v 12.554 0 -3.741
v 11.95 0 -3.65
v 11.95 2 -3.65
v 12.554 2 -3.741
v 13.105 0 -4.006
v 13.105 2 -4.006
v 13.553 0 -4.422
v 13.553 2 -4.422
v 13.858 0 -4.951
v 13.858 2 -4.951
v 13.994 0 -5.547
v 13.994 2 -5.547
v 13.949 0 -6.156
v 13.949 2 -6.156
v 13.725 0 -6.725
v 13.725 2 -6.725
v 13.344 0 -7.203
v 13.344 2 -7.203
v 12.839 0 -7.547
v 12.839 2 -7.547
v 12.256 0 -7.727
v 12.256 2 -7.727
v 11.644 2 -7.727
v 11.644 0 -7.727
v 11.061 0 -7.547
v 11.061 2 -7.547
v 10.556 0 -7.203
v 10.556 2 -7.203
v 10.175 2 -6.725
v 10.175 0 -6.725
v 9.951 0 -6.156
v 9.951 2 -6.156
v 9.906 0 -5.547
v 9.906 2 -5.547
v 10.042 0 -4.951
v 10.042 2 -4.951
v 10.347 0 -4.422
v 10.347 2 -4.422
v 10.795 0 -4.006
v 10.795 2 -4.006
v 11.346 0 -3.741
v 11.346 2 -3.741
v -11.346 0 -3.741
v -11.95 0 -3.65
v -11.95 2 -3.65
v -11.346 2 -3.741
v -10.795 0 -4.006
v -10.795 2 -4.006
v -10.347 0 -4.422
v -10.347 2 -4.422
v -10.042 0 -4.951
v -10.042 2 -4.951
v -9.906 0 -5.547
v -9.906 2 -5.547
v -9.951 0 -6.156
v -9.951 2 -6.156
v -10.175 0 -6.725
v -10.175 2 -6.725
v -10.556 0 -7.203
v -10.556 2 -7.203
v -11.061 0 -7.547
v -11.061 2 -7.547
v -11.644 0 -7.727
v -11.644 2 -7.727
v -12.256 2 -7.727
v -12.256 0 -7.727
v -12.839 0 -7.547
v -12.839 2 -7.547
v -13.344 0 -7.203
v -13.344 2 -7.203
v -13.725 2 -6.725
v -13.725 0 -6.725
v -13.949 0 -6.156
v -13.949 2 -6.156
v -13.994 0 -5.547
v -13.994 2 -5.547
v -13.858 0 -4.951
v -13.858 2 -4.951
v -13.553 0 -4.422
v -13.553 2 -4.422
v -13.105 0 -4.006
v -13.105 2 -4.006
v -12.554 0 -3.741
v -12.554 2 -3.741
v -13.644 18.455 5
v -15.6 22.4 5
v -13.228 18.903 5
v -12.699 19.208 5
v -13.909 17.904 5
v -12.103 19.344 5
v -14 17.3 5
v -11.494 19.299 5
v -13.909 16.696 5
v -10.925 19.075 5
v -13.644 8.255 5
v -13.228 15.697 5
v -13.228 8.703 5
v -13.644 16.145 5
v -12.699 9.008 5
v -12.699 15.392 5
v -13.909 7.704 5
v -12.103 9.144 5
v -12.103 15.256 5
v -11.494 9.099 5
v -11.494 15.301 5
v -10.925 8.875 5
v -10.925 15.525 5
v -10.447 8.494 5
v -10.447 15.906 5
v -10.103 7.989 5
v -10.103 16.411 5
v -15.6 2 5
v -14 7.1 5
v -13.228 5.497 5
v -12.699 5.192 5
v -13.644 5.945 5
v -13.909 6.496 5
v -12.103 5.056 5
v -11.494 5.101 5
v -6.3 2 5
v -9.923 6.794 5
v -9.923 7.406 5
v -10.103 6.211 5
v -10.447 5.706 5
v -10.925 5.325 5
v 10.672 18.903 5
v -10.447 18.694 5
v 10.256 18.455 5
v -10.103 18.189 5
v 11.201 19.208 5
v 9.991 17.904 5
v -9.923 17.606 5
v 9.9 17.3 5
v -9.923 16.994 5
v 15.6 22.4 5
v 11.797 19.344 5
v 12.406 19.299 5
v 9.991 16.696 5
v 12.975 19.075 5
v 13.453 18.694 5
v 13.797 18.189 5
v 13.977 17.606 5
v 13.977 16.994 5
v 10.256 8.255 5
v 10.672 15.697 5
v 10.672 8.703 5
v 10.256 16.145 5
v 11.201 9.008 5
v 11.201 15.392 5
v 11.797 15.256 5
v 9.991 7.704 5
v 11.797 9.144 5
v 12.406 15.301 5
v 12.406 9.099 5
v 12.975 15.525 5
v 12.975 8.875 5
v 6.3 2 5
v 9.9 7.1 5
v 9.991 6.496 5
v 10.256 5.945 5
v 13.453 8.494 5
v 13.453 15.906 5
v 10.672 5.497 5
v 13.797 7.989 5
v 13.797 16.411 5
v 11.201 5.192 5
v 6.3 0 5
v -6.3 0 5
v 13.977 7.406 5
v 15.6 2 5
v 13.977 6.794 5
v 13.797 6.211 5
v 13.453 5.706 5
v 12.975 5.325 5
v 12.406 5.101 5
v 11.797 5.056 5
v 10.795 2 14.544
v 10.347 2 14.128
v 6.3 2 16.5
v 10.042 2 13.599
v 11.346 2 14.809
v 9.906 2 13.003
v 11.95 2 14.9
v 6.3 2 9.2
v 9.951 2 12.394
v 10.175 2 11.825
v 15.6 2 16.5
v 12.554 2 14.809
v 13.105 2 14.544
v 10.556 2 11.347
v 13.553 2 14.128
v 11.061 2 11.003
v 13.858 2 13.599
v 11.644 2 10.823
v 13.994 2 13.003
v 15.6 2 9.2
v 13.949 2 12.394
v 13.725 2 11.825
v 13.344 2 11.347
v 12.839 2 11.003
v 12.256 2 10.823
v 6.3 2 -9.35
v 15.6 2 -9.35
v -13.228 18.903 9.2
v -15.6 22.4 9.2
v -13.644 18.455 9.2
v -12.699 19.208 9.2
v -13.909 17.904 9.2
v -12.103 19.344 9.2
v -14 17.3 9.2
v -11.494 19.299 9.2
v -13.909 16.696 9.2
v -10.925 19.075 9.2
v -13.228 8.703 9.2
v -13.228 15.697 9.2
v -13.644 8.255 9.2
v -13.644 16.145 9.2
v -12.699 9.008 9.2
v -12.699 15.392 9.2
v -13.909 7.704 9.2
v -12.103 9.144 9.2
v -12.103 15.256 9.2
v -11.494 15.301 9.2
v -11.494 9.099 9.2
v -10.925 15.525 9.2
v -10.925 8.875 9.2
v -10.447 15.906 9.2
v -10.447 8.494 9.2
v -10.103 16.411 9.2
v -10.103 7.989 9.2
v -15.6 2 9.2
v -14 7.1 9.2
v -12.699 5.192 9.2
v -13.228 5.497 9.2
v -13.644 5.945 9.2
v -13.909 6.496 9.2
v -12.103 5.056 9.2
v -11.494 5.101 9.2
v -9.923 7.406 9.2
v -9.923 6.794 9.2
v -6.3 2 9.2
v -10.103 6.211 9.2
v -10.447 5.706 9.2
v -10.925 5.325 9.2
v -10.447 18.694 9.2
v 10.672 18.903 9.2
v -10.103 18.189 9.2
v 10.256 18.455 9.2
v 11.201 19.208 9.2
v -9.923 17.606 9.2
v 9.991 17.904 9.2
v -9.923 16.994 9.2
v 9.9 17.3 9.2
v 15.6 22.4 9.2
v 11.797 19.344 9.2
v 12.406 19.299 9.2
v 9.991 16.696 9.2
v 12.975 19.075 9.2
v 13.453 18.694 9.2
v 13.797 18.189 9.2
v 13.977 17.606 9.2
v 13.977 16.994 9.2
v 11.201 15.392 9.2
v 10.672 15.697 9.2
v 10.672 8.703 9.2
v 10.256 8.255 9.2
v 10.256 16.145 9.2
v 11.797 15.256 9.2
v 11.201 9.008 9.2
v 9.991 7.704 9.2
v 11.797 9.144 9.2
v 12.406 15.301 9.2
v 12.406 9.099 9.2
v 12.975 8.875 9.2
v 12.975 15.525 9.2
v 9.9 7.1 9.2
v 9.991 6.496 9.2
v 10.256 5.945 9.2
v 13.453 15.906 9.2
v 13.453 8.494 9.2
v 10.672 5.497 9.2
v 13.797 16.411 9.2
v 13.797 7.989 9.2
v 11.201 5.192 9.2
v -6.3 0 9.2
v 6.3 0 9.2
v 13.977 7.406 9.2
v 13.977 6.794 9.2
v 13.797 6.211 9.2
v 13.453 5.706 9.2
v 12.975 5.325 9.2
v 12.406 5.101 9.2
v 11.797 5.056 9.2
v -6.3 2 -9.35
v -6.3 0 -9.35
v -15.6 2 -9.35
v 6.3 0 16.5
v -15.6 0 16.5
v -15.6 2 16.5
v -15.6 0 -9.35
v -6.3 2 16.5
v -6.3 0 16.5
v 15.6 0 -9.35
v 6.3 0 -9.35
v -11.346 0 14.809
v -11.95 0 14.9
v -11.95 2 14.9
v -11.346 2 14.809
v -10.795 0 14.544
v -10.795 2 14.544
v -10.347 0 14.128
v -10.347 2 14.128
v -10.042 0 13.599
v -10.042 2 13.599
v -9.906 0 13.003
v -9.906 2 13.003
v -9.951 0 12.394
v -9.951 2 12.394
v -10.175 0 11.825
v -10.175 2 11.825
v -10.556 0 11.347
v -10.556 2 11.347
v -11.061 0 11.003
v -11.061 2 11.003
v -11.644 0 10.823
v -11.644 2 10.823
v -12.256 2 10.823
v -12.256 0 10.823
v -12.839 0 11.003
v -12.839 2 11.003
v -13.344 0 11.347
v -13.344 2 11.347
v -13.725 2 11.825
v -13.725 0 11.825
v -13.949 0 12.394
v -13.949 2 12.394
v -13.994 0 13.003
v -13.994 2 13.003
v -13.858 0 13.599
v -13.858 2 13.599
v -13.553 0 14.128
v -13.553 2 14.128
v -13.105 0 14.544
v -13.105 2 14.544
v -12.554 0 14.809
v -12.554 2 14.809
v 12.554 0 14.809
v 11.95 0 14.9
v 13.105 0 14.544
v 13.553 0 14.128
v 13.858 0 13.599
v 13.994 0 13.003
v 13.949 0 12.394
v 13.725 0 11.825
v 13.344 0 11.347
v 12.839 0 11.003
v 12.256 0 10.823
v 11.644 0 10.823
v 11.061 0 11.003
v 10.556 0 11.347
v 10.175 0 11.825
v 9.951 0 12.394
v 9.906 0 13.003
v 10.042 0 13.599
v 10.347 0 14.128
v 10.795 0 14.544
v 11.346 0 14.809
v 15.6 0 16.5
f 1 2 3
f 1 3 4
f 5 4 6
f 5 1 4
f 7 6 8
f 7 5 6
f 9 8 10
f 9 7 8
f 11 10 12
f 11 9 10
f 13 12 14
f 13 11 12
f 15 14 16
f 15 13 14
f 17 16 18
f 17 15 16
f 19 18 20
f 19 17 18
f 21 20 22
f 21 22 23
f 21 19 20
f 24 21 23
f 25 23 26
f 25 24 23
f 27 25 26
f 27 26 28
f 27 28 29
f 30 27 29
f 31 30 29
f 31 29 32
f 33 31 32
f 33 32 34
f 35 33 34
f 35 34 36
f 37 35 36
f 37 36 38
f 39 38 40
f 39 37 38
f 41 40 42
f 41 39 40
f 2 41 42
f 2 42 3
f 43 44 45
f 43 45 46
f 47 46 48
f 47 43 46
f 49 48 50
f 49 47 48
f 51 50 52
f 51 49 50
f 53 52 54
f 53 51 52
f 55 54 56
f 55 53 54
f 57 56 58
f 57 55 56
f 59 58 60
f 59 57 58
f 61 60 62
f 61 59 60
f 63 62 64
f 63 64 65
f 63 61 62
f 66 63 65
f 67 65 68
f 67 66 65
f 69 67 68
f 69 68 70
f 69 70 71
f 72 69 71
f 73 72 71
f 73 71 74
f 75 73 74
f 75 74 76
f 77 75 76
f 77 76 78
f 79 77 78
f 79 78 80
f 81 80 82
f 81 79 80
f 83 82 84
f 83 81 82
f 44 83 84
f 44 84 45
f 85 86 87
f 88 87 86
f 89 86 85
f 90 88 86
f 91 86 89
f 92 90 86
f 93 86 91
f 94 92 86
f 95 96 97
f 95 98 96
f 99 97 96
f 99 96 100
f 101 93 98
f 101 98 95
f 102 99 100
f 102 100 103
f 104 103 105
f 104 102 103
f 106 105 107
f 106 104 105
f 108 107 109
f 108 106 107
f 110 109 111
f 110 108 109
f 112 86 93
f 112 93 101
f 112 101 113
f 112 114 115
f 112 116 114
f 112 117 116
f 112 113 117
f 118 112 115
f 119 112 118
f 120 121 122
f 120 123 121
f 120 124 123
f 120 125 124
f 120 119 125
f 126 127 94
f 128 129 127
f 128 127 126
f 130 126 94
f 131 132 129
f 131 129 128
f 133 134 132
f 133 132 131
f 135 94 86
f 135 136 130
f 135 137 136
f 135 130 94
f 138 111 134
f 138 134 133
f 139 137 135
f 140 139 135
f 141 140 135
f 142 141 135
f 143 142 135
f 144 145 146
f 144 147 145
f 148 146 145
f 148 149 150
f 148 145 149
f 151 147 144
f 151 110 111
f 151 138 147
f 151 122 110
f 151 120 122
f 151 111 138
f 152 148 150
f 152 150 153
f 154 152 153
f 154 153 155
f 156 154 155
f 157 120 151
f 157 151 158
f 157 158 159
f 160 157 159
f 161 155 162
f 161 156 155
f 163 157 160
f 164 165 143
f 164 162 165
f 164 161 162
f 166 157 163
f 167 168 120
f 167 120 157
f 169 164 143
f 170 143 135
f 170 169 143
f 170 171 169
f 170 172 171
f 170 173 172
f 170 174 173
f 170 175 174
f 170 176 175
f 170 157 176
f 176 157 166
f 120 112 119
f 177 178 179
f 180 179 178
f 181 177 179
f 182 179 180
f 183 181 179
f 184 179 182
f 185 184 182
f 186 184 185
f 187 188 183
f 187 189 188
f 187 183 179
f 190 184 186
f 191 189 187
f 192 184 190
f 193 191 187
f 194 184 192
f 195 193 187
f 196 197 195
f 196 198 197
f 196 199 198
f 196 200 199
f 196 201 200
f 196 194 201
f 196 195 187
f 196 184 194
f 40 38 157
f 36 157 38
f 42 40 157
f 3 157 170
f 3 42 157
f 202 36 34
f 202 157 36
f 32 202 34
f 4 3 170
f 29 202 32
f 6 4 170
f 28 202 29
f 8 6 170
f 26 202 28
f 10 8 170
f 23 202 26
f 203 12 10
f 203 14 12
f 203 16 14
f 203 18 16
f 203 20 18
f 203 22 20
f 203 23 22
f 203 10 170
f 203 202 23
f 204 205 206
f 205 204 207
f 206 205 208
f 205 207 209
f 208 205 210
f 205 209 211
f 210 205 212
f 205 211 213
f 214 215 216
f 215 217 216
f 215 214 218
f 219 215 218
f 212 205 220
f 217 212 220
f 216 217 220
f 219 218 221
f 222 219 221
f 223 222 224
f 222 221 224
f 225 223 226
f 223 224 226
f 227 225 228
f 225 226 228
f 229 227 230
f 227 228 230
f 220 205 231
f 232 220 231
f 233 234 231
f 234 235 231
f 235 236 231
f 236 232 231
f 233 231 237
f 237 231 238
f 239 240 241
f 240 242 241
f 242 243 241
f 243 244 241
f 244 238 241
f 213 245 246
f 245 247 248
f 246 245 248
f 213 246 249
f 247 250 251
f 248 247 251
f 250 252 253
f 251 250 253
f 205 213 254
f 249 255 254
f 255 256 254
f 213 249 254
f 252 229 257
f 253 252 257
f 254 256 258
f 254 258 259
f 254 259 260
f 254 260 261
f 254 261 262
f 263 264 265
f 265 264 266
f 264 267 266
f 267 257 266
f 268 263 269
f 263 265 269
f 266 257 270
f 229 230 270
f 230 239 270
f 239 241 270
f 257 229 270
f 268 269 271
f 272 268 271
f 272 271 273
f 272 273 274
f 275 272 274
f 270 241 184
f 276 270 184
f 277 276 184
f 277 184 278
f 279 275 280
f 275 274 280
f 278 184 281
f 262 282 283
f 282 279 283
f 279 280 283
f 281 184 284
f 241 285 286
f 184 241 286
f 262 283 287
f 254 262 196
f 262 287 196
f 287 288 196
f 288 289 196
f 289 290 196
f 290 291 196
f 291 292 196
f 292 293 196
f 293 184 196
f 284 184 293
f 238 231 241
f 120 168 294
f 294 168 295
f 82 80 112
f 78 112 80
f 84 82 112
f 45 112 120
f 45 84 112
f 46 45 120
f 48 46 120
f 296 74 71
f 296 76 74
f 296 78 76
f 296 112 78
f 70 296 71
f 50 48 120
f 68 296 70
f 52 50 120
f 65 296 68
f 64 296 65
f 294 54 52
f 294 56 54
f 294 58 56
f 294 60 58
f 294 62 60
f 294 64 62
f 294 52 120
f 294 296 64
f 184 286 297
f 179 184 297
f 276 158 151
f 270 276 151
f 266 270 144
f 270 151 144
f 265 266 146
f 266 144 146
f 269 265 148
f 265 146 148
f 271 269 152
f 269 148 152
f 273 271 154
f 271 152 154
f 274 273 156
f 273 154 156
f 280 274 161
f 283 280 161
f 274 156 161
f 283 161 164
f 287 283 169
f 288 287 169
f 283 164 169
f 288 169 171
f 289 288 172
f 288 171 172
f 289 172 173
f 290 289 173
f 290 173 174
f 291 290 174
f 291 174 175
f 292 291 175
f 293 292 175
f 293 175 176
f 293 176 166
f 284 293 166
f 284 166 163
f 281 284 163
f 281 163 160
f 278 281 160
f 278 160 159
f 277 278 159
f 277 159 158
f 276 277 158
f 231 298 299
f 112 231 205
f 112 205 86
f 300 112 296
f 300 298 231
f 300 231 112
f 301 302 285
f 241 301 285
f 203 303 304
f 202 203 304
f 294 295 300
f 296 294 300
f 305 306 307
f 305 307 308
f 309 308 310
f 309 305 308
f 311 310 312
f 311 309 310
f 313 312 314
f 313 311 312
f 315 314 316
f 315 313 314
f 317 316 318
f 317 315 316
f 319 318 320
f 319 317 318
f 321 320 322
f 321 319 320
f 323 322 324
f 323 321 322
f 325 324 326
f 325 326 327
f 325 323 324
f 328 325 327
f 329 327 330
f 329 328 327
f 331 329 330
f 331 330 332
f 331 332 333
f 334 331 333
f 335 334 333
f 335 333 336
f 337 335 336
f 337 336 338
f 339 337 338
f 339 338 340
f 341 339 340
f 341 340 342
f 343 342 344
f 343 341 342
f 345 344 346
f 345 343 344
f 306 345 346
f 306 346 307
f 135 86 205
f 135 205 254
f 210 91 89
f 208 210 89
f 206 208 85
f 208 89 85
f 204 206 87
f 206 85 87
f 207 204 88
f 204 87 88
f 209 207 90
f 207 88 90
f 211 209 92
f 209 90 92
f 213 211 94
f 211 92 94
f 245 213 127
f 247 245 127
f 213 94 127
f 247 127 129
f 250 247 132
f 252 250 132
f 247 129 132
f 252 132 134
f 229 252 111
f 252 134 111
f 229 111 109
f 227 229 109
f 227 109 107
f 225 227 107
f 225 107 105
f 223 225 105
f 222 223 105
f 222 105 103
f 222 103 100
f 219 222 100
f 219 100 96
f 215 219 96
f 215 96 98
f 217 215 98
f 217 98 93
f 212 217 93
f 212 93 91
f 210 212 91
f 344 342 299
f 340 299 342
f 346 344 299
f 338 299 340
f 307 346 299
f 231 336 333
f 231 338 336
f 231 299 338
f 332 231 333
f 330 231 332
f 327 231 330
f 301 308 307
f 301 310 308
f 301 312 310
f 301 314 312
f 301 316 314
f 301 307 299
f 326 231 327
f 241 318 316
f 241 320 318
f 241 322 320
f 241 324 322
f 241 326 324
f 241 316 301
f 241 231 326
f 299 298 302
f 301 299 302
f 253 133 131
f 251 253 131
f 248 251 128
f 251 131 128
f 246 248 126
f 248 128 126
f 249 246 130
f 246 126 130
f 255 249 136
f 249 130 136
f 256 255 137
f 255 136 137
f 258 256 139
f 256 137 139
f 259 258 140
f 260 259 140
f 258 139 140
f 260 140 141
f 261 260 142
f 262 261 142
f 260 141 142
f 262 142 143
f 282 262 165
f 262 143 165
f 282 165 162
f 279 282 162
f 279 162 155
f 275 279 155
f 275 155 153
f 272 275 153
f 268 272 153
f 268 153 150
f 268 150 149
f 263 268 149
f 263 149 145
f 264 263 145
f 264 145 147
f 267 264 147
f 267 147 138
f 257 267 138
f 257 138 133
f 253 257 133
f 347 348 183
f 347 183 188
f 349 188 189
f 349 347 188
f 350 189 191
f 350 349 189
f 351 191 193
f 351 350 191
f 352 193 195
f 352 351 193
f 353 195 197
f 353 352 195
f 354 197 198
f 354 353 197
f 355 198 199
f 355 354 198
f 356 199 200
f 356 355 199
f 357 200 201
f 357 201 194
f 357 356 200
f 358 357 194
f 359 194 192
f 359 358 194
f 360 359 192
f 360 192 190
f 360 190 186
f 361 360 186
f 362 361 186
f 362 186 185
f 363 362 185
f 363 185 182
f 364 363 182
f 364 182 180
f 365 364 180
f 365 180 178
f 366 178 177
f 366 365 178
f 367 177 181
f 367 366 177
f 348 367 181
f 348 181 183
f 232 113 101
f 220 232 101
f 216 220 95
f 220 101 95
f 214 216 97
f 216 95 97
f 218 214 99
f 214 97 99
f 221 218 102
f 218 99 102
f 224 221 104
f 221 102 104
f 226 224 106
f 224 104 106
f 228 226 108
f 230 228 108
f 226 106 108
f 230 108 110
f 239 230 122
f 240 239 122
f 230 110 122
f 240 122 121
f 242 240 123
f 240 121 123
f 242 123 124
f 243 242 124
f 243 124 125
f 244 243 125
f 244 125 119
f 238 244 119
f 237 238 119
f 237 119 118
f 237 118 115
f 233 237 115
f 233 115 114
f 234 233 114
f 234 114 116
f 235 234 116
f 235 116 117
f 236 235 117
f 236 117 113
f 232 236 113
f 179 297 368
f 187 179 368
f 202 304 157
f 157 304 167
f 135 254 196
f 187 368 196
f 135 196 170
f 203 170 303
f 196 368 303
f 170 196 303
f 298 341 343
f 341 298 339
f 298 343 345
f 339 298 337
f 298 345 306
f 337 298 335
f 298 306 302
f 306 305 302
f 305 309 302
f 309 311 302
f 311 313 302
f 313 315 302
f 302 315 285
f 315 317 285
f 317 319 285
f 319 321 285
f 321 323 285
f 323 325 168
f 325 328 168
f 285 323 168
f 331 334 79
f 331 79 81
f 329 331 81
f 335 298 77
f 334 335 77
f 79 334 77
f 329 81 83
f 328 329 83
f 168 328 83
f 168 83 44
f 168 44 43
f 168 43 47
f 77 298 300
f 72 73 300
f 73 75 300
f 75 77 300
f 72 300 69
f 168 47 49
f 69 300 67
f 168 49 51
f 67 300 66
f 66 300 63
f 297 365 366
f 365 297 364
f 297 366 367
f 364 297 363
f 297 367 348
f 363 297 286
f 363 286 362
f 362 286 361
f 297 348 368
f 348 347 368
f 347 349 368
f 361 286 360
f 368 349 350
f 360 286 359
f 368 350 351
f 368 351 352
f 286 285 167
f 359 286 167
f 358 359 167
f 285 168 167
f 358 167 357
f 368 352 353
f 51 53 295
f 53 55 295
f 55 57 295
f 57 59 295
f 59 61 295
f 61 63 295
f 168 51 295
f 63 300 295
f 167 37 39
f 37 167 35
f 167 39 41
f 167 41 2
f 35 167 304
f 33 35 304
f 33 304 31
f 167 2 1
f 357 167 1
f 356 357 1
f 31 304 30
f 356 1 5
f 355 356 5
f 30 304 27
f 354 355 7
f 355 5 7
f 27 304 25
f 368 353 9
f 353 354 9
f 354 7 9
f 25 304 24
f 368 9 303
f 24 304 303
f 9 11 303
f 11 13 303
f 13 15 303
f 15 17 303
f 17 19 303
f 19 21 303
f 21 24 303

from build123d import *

# Parameters (mm, degrees)
SKETCH1_R               = 2.05
BOSS_EXTRUDE1_DEPTH     = 2
BOSS_EXTRUDE2_START     = 2
BOSS_EXTRUDE2_OUTLINE_W = 31.2
BOSS_EXTRUDE2_OUTLINE_H = 4.2
BOSS_EXTRUDE2_DEPTH     = 20.4
SKETCH2_R               = 2.05
CUT_EXTRUDE1_DEPTH      = 31.838976961


# Read off the part's stored shape, not the designer's step: Boss-Extrude2
with BuildPart() as part:
    # Sketch1 → Boss-Extrude1 (new body)
    with BuildSketch(Plane(origin=(0, 0, 0), x_dir=(1, 0, 0), z_dir=(0, 1, 0))):
        Polygon((-6.3, -5), (-6.3, 9.35), (-15.6, 9.35), (-15.6, -16.5), (-6.3, -16.5), (-6.3, -9.2), (6.3, -9.2), (6.3, -16.5), (15.6, -16.5), (15.6, 9.35), (6.3, 9.35), (6.3, -5), align=None)
        with Locations(Location((11.95, -12.85, 0), (0, 0, 270))):
            Circle(SKETCH1_R, mode=Mode.SUBTRACT)
        with Locations(Location((-11.95, -12.85, 0), (0, 0, 270))):
            Circle(SKETCH1_R, mode=Mode.SUBTRACT)
        with Locations(Location((11.95, 5.7, 0), (0, 0, 270))):
            Circle(SKETCH1_R, mode=Mode.SUBTRACT)
        with Locations(Location((-11.95, 5.7, 0), (0, 0, 270))):
            Circle(SKETCH1_R, mode=Mode.SUBTRACT)
    extrude(amount=BOSS_EXTRUDE1_DEPTH)

    # Boss-Extrude2 outline → Boss-Extrude2 (add)
    with BuildSketch(Plane(origin=(0, 0, 0), x_dir=(1, 0, 0), z_dir=(0, 1, 0)).offset(BOSS_EXTRUDE2_START)):
        with Locations((0, -7.1)):
            Rectangle(BOSS_EXTRUDE2_OUTLINE_W, BOSS_EXTRUDE2_OUTLINE_H)
    extrude(amount=BOSS_EXTRUDE2_DEPTH)

    # Sketch2 → Cut-Extrude1 (cut, through all)
    with BuildSketch(Plane(origin=(0, 0, 5), x_dir=(-1, 0, 0), z_dir=(0, 0, -1))):
        with Locations((-11.95, 7.1)):
            Circle(SKETCH2_R)
        with Locations((-11.95, 17.3)):
            Circle(SKETCH2_R)
        with Locations((11.95, 7.1)):
            Circle(SKETCH2_R)
        with Locations((11.95, 17.3)):
            Circle(SKETCH2_R)
    extrude(amount=-CUT_EXTRUDE1_DEPTH, mode=Mode.SUBTRACT)


solid = part.part
